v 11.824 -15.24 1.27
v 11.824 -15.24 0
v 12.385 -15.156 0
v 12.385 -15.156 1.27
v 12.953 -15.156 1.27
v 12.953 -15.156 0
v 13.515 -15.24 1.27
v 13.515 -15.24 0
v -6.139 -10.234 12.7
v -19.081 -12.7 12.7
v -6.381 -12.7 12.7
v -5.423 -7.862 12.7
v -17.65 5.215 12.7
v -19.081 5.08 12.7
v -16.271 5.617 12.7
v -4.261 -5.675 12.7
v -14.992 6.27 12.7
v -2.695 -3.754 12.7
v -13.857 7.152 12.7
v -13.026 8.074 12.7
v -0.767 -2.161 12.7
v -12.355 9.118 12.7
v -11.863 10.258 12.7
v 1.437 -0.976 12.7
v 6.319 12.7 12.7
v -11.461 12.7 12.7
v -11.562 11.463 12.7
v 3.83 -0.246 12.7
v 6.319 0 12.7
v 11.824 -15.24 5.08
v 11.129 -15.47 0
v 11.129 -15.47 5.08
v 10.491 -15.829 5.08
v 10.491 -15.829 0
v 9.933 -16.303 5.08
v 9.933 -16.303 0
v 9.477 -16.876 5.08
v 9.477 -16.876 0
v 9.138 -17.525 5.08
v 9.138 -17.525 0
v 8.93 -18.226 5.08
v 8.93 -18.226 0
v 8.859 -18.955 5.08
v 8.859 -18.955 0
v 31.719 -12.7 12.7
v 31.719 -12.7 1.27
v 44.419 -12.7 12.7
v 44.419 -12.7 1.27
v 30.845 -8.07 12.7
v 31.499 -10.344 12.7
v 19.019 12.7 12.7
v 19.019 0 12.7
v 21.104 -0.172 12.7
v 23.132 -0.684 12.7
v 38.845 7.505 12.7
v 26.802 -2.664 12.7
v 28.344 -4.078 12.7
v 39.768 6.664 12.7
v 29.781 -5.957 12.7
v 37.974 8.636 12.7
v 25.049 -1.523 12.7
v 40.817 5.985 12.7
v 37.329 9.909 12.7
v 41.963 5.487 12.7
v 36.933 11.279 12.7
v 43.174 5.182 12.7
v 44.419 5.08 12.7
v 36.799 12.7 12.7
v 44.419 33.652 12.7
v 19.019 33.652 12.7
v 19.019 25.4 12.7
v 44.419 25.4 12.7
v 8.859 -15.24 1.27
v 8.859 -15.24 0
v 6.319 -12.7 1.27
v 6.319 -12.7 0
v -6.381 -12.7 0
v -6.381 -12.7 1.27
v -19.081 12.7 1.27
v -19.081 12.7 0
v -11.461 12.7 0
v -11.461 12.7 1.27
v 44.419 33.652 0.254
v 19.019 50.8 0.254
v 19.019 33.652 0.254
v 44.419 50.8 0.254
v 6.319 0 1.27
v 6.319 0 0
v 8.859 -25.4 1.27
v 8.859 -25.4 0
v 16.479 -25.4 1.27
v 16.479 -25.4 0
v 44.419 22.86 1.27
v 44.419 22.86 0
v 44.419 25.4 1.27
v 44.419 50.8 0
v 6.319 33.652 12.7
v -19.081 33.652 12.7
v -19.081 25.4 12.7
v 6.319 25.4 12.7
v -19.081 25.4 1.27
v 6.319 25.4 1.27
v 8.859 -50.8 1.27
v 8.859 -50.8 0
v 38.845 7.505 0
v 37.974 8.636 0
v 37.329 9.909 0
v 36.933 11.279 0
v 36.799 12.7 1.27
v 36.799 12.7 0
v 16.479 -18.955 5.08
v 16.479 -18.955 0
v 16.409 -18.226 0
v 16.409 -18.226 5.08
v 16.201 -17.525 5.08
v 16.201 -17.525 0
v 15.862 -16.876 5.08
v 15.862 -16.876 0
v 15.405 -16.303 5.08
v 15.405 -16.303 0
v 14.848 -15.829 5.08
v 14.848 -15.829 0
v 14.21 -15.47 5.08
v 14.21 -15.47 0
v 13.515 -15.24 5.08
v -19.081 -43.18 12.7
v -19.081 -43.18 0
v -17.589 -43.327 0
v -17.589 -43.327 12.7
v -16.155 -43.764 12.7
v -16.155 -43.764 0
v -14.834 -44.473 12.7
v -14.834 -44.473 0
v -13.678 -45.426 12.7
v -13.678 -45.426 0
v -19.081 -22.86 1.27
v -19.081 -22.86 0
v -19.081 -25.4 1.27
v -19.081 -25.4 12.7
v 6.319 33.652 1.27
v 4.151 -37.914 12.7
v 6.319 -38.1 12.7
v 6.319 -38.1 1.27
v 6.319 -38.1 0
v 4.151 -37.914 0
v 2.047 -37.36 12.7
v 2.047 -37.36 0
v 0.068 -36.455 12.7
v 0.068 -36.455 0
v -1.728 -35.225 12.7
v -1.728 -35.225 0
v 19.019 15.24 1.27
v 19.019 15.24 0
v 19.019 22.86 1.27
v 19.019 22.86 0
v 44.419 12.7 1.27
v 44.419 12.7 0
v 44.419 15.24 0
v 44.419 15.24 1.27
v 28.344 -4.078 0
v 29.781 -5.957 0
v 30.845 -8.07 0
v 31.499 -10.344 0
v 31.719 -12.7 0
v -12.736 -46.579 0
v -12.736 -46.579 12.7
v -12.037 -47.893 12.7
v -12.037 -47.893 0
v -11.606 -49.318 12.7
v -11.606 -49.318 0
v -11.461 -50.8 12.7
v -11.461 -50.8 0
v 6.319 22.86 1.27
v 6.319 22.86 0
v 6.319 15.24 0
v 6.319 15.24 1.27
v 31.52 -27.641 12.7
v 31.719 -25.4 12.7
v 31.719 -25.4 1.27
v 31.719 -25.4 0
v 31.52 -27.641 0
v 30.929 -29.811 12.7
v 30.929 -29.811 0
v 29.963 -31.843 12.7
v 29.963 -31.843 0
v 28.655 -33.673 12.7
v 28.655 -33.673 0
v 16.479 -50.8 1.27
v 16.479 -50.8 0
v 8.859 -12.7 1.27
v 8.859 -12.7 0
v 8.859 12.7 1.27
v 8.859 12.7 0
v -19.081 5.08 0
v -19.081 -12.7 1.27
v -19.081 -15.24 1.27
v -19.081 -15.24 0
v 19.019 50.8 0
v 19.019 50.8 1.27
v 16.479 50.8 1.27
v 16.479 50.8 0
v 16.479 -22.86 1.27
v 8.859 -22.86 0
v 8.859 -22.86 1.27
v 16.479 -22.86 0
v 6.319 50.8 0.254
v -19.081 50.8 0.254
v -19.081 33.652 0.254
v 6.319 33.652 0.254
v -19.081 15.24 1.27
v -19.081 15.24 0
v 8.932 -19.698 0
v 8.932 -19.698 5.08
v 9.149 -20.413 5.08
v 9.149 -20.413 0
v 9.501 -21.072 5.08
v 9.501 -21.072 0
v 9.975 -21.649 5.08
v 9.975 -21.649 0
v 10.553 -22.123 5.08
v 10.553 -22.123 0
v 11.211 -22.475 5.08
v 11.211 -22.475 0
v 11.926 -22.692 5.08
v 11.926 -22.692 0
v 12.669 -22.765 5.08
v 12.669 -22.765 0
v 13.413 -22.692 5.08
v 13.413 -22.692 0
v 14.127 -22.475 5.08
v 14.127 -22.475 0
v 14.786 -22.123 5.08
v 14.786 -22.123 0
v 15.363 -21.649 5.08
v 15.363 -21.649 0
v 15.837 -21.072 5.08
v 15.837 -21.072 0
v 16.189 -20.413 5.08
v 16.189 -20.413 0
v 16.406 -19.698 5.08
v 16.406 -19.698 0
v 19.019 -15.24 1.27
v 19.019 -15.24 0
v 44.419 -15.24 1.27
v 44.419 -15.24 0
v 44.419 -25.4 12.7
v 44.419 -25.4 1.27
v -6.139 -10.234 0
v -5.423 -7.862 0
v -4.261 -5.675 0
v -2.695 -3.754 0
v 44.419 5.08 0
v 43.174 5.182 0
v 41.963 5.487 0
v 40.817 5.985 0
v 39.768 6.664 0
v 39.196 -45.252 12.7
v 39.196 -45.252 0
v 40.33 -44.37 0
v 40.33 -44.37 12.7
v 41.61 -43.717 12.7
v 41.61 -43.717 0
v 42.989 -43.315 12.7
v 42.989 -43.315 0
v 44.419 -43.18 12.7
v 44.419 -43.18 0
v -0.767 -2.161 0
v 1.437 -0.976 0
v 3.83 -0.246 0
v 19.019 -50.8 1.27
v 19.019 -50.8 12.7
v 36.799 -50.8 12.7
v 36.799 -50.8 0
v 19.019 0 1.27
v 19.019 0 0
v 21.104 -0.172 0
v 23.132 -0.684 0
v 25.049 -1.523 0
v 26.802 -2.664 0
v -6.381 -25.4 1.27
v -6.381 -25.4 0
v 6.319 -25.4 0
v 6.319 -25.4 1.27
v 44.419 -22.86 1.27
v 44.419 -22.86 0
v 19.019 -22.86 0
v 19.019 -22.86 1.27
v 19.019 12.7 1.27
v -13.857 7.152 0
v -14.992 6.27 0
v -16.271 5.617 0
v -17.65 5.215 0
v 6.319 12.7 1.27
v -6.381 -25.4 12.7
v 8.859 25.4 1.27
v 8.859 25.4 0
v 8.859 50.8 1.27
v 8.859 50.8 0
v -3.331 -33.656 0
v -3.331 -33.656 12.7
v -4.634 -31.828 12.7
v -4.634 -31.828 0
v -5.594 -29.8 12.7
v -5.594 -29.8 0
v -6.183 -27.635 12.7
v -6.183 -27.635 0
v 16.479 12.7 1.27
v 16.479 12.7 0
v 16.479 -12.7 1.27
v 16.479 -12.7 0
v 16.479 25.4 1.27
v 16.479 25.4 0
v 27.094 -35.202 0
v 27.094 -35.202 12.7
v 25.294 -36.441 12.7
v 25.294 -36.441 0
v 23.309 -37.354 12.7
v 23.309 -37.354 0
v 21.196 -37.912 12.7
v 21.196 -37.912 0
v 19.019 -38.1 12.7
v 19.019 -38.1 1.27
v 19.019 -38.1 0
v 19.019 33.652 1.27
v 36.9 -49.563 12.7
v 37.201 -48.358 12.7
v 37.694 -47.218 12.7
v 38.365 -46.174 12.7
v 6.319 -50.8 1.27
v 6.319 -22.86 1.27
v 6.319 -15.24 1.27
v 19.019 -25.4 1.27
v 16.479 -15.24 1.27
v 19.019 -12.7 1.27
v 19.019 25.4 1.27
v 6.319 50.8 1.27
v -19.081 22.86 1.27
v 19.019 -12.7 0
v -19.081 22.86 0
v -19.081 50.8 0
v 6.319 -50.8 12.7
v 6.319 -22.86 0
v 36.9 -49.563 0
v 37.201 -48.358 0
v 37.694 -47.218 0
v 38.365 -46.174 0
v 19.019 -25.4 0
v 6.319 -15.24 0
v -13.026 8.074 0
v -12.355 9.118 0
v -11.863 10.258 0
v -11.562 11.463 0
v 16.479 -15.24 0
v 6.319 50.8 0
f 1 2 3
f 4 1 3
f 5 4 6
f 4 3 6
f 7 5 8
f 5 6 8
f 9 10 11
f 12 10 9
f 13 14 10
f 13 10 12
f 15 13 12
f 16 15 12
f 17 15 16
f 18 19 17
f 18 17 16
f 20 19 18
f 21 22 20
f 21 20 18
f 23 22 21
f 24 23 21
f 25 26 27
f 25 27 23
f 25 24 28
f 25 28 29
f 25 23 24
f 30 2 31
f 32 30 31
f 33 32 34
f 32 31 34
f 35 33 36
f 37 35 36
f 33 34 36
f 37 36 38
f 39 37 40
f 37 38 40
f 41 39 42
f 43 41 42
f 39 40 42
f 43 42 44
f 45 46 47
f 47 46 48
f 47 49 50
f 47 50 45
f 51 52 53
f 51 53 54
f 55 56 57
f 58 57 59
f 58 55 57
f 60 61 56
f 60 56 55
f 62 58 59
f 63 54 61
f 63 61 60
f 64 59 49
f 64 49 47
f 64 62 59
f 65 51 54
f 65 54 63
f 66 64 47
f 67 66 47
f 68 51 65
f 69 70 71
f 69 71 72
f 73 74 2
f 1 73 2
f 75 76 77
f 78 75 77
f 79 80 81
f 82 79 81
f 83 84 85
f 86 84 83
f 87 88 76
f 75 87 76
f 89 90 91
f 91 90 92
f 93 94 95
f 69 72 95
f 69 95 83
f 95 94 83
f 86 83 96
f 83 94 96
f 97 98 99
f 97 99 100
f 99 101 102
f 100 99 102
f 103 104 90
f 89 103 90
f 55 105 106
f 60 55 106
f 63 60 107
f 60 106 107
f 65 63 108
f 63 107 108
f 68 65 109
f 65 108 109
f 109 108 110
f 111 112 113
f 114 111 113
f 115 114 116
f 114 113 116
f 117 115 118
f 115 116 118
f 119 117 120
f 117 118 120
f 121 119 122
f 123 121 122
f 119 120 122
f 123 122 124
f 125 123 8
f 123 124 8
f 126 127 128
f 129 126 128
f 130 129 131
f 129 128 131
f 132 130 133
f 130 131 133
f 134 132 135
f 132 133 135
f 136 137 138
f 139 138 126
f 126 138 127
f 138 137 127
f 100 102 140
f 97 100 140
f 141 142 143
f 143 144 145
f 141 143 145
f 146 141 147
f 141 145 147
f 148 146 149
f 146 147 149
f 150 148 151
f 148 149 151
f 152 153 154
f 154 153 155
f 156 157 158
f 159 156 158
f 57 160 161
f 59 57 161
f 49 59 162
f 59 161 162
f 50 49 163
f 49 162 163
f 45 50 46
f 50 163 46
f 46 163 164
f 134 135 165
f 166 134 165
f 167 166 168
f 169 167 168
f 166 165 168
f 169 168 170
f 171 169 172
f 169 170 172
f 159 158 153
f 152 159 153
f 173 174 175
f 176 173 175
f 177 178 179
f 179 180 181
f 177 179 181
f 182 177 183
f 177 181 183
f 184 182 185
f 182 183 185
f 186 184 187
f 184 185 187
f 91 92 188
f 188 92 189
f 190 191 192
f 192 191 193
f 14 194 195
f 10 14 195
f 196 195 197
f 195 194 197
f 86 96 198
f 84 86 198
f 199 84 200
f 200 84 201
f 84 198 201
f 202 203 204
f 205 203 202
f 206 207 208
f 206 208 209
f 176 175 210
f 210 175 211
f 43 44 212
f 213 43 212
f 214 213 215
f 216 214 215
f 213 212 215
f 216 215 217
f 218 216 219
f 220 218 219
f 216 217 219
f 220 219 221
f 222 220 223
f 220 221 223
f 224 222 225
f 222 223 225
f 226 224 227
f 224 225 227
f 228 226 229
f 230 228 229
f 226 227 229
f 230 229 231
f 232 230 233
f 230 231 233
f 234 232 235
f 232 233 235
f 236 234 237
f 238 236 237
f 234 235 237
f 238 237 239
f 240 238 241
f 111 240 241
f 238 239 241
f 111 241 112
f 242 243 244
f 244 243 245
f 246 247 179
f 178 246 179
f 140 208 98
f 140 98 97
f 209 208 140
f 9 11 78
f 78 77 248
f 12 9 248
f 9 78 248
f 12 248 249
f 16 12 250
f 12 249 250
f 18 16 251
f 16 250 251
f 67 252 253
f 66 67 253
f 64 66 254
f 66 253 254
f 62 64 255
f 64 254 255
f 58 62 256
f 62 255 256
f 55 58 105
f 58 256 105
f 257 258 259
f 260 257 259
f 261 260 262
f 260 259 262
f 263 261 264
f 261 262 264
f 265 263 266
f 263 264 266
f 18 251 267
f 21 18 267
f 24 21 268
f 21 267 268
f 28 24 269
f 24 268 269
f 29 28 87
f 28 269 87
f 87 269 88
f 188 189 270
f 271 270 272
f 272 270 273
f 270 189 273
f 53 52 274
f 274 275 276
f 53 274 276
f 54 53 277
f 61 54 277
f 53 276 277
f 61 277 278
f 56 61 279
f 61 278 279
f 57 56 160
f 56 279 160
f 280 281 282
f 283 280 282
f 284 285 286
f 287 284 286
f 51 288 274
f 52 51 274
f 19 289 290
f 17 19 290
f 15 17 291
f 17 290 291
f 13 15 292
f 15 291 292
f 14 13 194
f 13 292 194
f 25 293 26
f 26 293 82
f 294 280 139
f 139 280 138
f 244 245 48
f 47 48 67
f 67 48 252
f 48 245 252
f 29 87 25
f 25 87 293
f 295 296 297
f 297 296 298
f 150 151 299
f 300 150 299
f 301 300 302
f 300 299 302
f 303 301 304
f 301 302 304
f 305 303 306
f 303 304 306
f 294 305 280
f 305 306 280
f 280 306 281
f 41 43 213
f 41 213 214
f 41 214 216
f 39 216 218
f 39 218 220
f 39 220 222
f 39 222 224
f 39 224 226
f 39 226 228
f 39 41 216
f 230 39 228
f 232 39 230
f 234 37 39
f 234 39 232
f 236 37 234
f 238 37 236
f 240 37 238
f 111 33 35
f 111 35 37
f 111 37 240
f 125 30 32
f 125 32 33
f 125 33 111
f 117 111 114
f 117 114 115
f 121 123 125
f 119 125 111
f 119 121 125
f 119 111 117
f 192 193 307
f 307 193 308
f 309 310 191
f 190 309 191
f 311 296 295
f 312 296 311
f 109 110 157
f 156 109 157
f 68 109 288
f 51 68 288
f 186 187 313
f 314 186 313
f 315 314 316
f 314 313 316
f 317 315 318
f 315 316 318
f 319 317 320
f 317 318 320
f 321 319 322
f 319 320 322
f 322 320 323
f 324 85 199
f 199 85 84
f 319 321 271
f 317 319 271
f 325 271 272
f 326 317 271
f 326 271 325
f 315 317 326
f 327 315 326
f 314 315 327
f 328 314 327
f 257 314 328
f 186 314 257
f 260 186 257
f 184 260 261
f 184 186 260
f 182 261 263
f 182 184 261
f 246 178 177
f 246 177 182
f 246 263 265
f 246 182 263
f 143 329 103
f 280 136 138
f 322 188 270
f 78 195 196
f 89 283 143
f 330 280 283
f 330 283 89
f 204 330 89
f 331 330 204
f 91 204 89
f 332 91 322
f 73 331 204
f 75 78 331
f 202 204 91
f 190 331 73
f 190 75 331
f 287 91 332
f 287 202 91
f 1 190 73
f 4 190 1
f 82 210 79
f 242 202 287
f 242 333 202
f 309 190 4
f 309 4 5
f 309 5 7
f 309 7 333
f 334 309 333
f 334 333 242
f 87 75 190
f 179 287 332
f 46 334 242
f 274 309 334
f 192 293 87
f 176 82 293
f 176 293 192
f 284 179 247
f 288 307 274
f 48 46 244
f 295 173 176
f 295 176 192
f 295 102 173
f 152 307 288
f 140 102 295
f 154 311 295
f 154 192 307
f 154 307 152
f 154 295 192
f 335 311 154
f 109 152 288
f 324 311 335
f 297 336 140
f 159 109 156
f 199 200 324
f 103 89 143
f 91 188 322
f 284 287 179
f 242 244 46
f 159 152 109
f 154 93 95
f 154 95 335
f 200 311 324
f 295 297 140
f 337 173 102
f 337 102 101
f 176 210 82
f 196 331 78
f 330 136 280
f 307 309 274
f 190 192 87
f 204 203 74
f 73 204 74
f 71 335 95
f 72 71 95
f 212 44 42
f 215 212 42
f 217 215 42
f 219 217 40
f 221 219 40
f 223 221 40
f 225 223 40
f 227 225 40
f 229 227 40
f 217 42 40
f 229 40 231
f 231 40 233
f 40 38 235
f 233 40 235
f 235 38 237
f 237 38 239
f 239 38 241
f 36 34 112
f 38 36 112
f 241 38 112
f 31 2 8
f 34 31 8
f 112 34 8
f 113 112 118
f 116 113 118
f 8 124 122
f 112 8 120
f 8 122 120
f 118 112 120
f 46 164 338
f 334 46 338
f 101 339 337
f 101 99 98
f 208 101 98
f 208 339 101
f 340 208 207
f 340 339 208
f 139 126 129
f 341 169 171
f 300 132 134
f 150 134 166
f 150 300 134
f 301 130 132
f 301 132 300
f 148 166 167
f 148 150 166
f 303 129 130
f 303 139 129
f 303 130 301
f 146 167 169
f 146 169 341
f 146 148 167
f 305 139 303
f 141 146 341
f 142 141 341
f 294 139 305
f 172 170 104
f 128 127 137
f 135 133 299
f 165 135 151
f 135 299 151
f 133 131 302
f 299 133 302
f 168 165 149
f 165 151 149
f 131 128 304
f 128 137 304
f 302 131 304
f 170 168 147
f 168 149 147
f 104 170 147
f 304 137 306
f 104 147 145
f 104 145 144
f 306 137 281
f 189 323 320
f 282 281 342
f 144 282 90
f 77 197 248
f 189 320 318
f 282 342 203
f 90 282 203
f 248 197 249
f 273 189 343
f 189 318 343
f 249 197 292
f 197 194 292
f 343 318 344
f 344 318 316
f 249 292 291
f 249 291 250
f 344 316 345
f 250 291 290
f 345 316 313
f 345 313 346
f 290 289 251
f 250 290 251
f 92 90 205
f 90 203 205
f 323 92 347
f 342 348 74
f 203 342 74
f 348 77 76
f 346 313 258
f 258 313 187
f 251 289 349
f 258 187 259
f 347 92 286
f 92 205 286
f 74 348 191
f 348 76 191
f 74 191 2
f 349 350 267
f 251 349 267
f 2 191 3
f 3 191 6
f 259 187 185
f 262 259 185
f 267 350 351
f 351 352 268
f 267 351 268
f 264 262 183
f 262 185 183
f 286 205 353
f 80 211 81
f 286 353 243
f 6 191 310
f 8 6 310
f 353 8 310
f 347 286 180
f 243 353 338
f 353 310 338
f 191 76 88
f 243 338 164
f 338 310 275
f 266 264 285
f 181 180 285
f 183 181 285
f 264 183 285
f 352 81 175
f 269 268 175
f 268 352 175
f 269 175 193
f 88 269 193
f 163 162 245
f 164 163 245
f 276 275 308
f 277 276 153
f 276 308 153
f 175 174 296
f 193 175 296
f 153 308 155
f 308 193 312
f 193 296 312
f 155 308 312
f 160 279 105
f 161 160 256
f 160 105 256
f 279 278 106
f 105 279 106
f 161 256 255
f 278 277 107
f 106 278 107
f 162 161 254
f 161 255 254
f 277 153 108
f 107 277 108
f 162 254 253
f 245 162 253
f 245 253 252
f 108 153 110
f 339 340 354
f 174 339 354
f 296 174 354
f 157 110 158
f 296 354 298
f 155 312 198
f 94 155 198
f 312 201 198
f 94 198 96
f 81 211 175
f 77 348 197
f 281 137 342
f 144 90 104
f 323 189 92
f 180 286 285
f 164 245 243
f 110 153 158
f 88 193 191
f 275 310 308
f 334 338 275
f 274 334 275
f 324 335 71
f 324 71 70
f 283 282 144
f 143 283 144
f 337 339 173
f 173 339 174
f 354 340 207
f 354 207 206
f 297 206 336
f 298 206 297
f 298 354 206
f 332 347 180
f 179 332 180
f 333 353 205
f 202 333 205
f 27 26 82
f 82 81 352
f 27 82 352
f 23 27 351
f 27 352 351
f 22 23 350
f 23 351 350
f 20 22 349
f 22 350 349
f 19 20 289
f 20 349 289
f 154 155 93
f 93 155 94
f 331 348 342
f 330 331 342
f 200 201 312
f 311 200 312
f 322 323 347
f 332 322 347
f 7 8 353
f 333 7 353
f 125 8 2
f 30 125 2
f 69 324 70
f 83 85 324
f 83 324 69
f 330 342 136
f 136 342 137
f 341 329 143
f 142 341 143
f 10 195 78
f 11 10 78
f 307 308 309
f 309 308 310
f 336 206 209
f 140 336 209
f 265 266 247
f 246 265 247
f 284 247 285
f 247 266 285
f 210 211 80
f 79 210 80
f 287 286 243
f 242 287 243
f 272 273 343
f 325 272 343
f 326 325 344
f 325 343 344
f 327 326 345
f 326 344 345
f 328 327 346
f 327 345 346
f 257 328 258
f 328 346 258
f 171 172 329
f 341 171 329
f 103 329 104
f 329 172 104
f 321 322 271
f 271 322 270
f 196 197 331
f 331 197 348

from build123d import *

# Parameters (mm, degrees)
F1_DEPTH = 5.08
F0_W     = 7.62
F0_H     = 7.62
F0_H_2   = 2.54
F0_W_2   = 2.54
F0_W_3   = 25.4
F2_DEPTH = 1.27
F0_H_3   = 8.2517393589
F3_DEPTH = 12.7
F0_H_4   = 17.1482606411
F4_DEPTH = 0.254


with BuildPart() as f1:
    # F0 (on Top) → F1 (new body)
    with BuildSketch(Plane.XY):
        with BuildLine():
            ThreePointArc((11.8236929674, -15.24), (9.6912048674, -16.5785939593), (8.8592705512, -18.954982938))
            ThreePointArc((8.8592705512, -18.954982938), (12.6692705296, -22.7649829811), (16.4792705512, -18.9549829811))
            ThreePointArc((16.4792705512, -18.9549829811), (15.6473362485, -16.5785939761), (13.514848135, -15.24))
            Line((13.514848135, -15.24), (11.8236929674, -15.24))
        make_face()
    extrude(amount=F1_DEPTH)


with BuildPart() as f2:
    # F0 (on Top) → F2 (new body)
    with BuildSketch(Plane.XY):
        Polygon((8.8592705512, 50.8), (6.3192705512, 50.8), (6.3192705512, 33.6517393589), (6.3192705512, 25.4), (8.8592705512, 25.4), align=None)
        Polygon((16.4792705512, 50.8), (16.4792705512, 25.4), (19.0192705512, 25.4), (19.0192705512, 33.6517393589), (19.0192705512, 50.8), align=None)
        with Locations((12.6692705512, 19.05)):
            Rectangle(F0_W, F0_H)
        with Locations((12.6692705512, 24.13)):
            Rectangle(F0_W, F0_H_2)
        with Locations((7.5892705512, 24.13)):
            Rectangle(F0_W_2, F0_H_2)
        with Locations((-6.3807294488, 24.13)):
            Rectangle(F0_W_3, F0_H_2)
        with Locations((7.5892705512, 19.05)):
            Rectangle(F0_W_2, F0_H)
        with Locations((17.7492705512, 19.05)):
            Rectangle(F0_W_2, F0_H)
        with Locations((31.7192705512, 24.13)):
            Rectangle(F0_W_3, F0_H_2)
        with Locations((17.7492705512, 24.13)):
            Rectangle(F0_W_2, F0_H_2)
        Polygon((44.4192705512, 15.24), (19.0192705512, 15.24), (19.0192705512, 12.7), (36.7992705512, 12.7), (44.4192705512, 12.7), align=None)
        with Locations((17.7492705512, 13.97)):
            Rectangle(F0_W_2, F0_H_2)
        with Locations((7.5892705512, 13.97)):
            Rectangle(F0_W_2, F0_H_2)
        Polygon((6.3192705512, 12.7), (6.3192705512, 15.24), (-19.0807294488, 15.24), (-19.0807294488, 12.7), (-11.4607294488, 12.7), align=None)
        with Locations((12.6692705512, 13.97)):
            Rectangle(F0_W, F0_H_2)
        Polygon((8.8592705512, 12.7), (6.3192705512, 12.7), (6.3192705512, 0), (6.3192705512, -12.7), (8.8592705512, -12.7), align=None)
        Polygon((19.0192705512, 12.7), (16.4792705512, 12.7), (16.4792705512, -12.7), (19.0192705512, -12.7), (19.0192705512, 0), align=None)
        Polygon((6.3192705512, -15.24), (6.3192705512, -12.7), (-6.3807294488, -12.7), (-19.0807294488, -12.7), (-19.0807294488, -15.24), align=None)
        with Locations((7.5892705512, -13.97)):
            Rectangle(F0_W_2, F0_H_2)
        with BuildLine():
            Line((16.4792705512, -12.7), (8.8592705512, -12.7))
            Line((8.8592705512, -12.7), (8.8592705512, -15.24))
            Line((8.8592705512, -15.24), (11.8236929674, -15.24))
            ThreePointArc((11.8236929674, -15.24), (12.6692705512, -15.1449829811), (13.514848135, -15.24))
            Line((13.514848135, -15.24), (16.4792705512, -15.24))
            Line((16.4792705512, -15.24), (16.4792705512, -12.7))
        make_face()
        with Locations((17.7492705512, -13.97)):
            Rectangle(F0_W_2, F0_H_2)
        Polygon((31.7192705512, -12.7), (19.0192705512, -12.7), (19.0192705512, -15.24), (44.4192705512, -15.24), (44.4192705512, -12.7), align=None)
        Polygon((19.0192705512, -15.24), (16.4792705512, -15.24), (16.4792705512, -18.9549829811), (16.4792705512, -22.86), (19.0192705512, -22.86), align=None)
        Polygon((8.8592705512, -18.954982938), (8.8592705512, -15.24), (6.3192705512, -15.24), (6.3192705512, -22.86), (8.8592705512, -22.86), align=None)
        with Locations((12.6692705512, -24.13)):
            Rectangle(F0_W, F0_H_2)
        with Locations((7.5892705512, -24.13)):
            Rectangle(F0_W_2, F0_H_2)
        Polygon((6.3192705512, -25.4), (6.3192705512, -22.86), (-19.0807294488, -22.86), (-19.0807294488, -25.4), (-6.3807294488, -25.4), align=None)
        Polygon((44.4192705512, -22.86), (19.0192705512, -22.86), (19.0192705512, -25.4), (31.7192705512, -25.4), (44.4192705512, -25.4), align=None)
        with Locations((17.7492705512, -24.13)):
            Rectangle(F0_W_2, F0_H_2)
        Polygon((19.0192705512, -25.4), (16.4792705512, -25.4), (16.4792705512, -50.8), (19.0192705512, -50.8), (19.0192705512, -38.1), align=None)
        Polygon((8.8592705512, -25.4), (6.3192705512, -25.4), (6.3192705512, -38.1), (6.3192705512, -50.8), (8.8592705512, -50.8), align=None)
    extrude(amount=F2_DEPTH)

    # F0 (on Top) → F3 (join)
    with BuildSketch(Plane.XY):
        with Locations((-6.3807294488, 29.5258696795)):
            Rectangle(F0_W_3, F0_H_3)
        with Locations((31.7192705512, 29.5258696795)):
            Rectangle(F0_W_3, F0_H_3)
        with BuildLine():
            Line((6.3192705512, 0), (6.3192705512, 12.7))
            Line((6.3192705512, 12.7), (-11.4607294488, 12.7))
            ThreePointArc((-11.4607294488, 12.7), (-12.0854948202, 9.6782302386), (-13.8573416512, 7.151971529))
            ThreePointArc((-13.8573416512, 7.151971529), (-16.2710654964, 5.6169082687), (-19.0807294488, 5.08))
            Line((-19.0807294488, 5.08), (-19.0807294488, -12.7))
            Line((-19.0807294488, -12.7), (-6.3807294488, -12.7))
            ThreePointArc((-6.3807294488, -12.7), (-5.4233122083, -7.8624644563), (-2.6954144666, -3.7543052797))
            ThreePointArc((-2.6954144666, -3.7543052797), (1.4366648405, -0.9760859149), (6.3192705512, 0))
        make_face()
        with BuildLine():
            Line((36.7992705512, 12.7), (19.0192705512, 12.7))
            Line((19.0192705512, 12.7), (19.0192705512, 0))
            ThreePointArc((19.0192705512, 0), (24.108011302, -1.0640764195), (28.34402622, -4.0779972329))
            ThreePointArc((28.34402622, -4.0779972329), (30.8453941129, -8.0704426234), (31.7192705512, -12.7))
            Line((31.7192705512, -12.7), (44.4192705512, -12.7))
            Line((44.4192705512, -12.7), (44.4192705512, 5.08))
            ThreePointArc((44.4192705512, 5.08), (41.3795616585, 5.7125419609), (38.8445098324, 7.505152271))
            ThreePointArc((38.8445098324, 7.505152271), (37.3289928177, 9.9085198082), (36.7992705512, 12.7))
        make_face()
        with BuildLine():
            Line((44.4192705512, -25.4), (31.7192705512, -25.4))
            ThreePointArc((31.7192705512, -25.4), (30.9285782234, -29.8111665996), (28.6549570442, -33.6730614532))
            ThreePointArc((28.6549570442, -33.6730614532), (24.3212569499, -36.9403180298), (19.0192705512, -38.1))
            Line((19.0192705512, -38.1), (19.0192705512, -50.8))
            Line((19.0192705512, -50.8), (36.7992705512, -50.8))
            ThreePointArc((36.7992705512, -50.8), (37.4241240621, -47.7780262087), (39.1962064031, -45.2516668355))
            ThreePointArc((39.1962064031, -45.2516668355), (41.6098131938, -43.7168263217), (44.4192705512, -43.18))
            Line((44.4192705512, -43.18), (44.4192705512, -25.4))
        make_face()
        with BuildLine():
            ThreePointArc((-1.7277739655, -35.2252264374), (-5.1586967201, -30.8356478288), (-6.3807294488, -25.4))
            Line((-6.3807294488, -25.4), (-19.0807294488, -25.4))
            Line((-19.0807294488, -25.4), (-19.0807294488, -43.18))
            ThreePointArc((-19.0807294488, -43.18), (-16.155204139, -43.7639711725), (-13.6780836704, -45.4263775167))
            ThreePointArc((-13.6780836704, -45.4263775167), (-12.0368469671, -47.8934350886), (-11.4607294488, -50.8))
            Line((-11.4607294488, -50.8), (6.3192705512, -50.8))
            Line((6.3192705512, -50.8), (6.3192705512, -38.1))
            ThreePointArc((6.3192705512, -38.1), (2.0467054993, -37.3597319317), (-1.7277739655, -35.2252264374))
        make_face()
    extrude(amount=F3_DEPTH)

    # F0 (on Top) → F4 (join)
    with BuildSketch(Plane.XY):
        with Locations((-6.3807294488, 42.2258696795)):
            Rectangle(F0_W_3, F0_H_4)
        with Locations((31.7192705512, 42.2258696795)):
            Rectangle(F0_W_3, F0_H_4)
    extrude(amount=F4_DEPTH)


solid = Compound([f1.part, f2.part])
